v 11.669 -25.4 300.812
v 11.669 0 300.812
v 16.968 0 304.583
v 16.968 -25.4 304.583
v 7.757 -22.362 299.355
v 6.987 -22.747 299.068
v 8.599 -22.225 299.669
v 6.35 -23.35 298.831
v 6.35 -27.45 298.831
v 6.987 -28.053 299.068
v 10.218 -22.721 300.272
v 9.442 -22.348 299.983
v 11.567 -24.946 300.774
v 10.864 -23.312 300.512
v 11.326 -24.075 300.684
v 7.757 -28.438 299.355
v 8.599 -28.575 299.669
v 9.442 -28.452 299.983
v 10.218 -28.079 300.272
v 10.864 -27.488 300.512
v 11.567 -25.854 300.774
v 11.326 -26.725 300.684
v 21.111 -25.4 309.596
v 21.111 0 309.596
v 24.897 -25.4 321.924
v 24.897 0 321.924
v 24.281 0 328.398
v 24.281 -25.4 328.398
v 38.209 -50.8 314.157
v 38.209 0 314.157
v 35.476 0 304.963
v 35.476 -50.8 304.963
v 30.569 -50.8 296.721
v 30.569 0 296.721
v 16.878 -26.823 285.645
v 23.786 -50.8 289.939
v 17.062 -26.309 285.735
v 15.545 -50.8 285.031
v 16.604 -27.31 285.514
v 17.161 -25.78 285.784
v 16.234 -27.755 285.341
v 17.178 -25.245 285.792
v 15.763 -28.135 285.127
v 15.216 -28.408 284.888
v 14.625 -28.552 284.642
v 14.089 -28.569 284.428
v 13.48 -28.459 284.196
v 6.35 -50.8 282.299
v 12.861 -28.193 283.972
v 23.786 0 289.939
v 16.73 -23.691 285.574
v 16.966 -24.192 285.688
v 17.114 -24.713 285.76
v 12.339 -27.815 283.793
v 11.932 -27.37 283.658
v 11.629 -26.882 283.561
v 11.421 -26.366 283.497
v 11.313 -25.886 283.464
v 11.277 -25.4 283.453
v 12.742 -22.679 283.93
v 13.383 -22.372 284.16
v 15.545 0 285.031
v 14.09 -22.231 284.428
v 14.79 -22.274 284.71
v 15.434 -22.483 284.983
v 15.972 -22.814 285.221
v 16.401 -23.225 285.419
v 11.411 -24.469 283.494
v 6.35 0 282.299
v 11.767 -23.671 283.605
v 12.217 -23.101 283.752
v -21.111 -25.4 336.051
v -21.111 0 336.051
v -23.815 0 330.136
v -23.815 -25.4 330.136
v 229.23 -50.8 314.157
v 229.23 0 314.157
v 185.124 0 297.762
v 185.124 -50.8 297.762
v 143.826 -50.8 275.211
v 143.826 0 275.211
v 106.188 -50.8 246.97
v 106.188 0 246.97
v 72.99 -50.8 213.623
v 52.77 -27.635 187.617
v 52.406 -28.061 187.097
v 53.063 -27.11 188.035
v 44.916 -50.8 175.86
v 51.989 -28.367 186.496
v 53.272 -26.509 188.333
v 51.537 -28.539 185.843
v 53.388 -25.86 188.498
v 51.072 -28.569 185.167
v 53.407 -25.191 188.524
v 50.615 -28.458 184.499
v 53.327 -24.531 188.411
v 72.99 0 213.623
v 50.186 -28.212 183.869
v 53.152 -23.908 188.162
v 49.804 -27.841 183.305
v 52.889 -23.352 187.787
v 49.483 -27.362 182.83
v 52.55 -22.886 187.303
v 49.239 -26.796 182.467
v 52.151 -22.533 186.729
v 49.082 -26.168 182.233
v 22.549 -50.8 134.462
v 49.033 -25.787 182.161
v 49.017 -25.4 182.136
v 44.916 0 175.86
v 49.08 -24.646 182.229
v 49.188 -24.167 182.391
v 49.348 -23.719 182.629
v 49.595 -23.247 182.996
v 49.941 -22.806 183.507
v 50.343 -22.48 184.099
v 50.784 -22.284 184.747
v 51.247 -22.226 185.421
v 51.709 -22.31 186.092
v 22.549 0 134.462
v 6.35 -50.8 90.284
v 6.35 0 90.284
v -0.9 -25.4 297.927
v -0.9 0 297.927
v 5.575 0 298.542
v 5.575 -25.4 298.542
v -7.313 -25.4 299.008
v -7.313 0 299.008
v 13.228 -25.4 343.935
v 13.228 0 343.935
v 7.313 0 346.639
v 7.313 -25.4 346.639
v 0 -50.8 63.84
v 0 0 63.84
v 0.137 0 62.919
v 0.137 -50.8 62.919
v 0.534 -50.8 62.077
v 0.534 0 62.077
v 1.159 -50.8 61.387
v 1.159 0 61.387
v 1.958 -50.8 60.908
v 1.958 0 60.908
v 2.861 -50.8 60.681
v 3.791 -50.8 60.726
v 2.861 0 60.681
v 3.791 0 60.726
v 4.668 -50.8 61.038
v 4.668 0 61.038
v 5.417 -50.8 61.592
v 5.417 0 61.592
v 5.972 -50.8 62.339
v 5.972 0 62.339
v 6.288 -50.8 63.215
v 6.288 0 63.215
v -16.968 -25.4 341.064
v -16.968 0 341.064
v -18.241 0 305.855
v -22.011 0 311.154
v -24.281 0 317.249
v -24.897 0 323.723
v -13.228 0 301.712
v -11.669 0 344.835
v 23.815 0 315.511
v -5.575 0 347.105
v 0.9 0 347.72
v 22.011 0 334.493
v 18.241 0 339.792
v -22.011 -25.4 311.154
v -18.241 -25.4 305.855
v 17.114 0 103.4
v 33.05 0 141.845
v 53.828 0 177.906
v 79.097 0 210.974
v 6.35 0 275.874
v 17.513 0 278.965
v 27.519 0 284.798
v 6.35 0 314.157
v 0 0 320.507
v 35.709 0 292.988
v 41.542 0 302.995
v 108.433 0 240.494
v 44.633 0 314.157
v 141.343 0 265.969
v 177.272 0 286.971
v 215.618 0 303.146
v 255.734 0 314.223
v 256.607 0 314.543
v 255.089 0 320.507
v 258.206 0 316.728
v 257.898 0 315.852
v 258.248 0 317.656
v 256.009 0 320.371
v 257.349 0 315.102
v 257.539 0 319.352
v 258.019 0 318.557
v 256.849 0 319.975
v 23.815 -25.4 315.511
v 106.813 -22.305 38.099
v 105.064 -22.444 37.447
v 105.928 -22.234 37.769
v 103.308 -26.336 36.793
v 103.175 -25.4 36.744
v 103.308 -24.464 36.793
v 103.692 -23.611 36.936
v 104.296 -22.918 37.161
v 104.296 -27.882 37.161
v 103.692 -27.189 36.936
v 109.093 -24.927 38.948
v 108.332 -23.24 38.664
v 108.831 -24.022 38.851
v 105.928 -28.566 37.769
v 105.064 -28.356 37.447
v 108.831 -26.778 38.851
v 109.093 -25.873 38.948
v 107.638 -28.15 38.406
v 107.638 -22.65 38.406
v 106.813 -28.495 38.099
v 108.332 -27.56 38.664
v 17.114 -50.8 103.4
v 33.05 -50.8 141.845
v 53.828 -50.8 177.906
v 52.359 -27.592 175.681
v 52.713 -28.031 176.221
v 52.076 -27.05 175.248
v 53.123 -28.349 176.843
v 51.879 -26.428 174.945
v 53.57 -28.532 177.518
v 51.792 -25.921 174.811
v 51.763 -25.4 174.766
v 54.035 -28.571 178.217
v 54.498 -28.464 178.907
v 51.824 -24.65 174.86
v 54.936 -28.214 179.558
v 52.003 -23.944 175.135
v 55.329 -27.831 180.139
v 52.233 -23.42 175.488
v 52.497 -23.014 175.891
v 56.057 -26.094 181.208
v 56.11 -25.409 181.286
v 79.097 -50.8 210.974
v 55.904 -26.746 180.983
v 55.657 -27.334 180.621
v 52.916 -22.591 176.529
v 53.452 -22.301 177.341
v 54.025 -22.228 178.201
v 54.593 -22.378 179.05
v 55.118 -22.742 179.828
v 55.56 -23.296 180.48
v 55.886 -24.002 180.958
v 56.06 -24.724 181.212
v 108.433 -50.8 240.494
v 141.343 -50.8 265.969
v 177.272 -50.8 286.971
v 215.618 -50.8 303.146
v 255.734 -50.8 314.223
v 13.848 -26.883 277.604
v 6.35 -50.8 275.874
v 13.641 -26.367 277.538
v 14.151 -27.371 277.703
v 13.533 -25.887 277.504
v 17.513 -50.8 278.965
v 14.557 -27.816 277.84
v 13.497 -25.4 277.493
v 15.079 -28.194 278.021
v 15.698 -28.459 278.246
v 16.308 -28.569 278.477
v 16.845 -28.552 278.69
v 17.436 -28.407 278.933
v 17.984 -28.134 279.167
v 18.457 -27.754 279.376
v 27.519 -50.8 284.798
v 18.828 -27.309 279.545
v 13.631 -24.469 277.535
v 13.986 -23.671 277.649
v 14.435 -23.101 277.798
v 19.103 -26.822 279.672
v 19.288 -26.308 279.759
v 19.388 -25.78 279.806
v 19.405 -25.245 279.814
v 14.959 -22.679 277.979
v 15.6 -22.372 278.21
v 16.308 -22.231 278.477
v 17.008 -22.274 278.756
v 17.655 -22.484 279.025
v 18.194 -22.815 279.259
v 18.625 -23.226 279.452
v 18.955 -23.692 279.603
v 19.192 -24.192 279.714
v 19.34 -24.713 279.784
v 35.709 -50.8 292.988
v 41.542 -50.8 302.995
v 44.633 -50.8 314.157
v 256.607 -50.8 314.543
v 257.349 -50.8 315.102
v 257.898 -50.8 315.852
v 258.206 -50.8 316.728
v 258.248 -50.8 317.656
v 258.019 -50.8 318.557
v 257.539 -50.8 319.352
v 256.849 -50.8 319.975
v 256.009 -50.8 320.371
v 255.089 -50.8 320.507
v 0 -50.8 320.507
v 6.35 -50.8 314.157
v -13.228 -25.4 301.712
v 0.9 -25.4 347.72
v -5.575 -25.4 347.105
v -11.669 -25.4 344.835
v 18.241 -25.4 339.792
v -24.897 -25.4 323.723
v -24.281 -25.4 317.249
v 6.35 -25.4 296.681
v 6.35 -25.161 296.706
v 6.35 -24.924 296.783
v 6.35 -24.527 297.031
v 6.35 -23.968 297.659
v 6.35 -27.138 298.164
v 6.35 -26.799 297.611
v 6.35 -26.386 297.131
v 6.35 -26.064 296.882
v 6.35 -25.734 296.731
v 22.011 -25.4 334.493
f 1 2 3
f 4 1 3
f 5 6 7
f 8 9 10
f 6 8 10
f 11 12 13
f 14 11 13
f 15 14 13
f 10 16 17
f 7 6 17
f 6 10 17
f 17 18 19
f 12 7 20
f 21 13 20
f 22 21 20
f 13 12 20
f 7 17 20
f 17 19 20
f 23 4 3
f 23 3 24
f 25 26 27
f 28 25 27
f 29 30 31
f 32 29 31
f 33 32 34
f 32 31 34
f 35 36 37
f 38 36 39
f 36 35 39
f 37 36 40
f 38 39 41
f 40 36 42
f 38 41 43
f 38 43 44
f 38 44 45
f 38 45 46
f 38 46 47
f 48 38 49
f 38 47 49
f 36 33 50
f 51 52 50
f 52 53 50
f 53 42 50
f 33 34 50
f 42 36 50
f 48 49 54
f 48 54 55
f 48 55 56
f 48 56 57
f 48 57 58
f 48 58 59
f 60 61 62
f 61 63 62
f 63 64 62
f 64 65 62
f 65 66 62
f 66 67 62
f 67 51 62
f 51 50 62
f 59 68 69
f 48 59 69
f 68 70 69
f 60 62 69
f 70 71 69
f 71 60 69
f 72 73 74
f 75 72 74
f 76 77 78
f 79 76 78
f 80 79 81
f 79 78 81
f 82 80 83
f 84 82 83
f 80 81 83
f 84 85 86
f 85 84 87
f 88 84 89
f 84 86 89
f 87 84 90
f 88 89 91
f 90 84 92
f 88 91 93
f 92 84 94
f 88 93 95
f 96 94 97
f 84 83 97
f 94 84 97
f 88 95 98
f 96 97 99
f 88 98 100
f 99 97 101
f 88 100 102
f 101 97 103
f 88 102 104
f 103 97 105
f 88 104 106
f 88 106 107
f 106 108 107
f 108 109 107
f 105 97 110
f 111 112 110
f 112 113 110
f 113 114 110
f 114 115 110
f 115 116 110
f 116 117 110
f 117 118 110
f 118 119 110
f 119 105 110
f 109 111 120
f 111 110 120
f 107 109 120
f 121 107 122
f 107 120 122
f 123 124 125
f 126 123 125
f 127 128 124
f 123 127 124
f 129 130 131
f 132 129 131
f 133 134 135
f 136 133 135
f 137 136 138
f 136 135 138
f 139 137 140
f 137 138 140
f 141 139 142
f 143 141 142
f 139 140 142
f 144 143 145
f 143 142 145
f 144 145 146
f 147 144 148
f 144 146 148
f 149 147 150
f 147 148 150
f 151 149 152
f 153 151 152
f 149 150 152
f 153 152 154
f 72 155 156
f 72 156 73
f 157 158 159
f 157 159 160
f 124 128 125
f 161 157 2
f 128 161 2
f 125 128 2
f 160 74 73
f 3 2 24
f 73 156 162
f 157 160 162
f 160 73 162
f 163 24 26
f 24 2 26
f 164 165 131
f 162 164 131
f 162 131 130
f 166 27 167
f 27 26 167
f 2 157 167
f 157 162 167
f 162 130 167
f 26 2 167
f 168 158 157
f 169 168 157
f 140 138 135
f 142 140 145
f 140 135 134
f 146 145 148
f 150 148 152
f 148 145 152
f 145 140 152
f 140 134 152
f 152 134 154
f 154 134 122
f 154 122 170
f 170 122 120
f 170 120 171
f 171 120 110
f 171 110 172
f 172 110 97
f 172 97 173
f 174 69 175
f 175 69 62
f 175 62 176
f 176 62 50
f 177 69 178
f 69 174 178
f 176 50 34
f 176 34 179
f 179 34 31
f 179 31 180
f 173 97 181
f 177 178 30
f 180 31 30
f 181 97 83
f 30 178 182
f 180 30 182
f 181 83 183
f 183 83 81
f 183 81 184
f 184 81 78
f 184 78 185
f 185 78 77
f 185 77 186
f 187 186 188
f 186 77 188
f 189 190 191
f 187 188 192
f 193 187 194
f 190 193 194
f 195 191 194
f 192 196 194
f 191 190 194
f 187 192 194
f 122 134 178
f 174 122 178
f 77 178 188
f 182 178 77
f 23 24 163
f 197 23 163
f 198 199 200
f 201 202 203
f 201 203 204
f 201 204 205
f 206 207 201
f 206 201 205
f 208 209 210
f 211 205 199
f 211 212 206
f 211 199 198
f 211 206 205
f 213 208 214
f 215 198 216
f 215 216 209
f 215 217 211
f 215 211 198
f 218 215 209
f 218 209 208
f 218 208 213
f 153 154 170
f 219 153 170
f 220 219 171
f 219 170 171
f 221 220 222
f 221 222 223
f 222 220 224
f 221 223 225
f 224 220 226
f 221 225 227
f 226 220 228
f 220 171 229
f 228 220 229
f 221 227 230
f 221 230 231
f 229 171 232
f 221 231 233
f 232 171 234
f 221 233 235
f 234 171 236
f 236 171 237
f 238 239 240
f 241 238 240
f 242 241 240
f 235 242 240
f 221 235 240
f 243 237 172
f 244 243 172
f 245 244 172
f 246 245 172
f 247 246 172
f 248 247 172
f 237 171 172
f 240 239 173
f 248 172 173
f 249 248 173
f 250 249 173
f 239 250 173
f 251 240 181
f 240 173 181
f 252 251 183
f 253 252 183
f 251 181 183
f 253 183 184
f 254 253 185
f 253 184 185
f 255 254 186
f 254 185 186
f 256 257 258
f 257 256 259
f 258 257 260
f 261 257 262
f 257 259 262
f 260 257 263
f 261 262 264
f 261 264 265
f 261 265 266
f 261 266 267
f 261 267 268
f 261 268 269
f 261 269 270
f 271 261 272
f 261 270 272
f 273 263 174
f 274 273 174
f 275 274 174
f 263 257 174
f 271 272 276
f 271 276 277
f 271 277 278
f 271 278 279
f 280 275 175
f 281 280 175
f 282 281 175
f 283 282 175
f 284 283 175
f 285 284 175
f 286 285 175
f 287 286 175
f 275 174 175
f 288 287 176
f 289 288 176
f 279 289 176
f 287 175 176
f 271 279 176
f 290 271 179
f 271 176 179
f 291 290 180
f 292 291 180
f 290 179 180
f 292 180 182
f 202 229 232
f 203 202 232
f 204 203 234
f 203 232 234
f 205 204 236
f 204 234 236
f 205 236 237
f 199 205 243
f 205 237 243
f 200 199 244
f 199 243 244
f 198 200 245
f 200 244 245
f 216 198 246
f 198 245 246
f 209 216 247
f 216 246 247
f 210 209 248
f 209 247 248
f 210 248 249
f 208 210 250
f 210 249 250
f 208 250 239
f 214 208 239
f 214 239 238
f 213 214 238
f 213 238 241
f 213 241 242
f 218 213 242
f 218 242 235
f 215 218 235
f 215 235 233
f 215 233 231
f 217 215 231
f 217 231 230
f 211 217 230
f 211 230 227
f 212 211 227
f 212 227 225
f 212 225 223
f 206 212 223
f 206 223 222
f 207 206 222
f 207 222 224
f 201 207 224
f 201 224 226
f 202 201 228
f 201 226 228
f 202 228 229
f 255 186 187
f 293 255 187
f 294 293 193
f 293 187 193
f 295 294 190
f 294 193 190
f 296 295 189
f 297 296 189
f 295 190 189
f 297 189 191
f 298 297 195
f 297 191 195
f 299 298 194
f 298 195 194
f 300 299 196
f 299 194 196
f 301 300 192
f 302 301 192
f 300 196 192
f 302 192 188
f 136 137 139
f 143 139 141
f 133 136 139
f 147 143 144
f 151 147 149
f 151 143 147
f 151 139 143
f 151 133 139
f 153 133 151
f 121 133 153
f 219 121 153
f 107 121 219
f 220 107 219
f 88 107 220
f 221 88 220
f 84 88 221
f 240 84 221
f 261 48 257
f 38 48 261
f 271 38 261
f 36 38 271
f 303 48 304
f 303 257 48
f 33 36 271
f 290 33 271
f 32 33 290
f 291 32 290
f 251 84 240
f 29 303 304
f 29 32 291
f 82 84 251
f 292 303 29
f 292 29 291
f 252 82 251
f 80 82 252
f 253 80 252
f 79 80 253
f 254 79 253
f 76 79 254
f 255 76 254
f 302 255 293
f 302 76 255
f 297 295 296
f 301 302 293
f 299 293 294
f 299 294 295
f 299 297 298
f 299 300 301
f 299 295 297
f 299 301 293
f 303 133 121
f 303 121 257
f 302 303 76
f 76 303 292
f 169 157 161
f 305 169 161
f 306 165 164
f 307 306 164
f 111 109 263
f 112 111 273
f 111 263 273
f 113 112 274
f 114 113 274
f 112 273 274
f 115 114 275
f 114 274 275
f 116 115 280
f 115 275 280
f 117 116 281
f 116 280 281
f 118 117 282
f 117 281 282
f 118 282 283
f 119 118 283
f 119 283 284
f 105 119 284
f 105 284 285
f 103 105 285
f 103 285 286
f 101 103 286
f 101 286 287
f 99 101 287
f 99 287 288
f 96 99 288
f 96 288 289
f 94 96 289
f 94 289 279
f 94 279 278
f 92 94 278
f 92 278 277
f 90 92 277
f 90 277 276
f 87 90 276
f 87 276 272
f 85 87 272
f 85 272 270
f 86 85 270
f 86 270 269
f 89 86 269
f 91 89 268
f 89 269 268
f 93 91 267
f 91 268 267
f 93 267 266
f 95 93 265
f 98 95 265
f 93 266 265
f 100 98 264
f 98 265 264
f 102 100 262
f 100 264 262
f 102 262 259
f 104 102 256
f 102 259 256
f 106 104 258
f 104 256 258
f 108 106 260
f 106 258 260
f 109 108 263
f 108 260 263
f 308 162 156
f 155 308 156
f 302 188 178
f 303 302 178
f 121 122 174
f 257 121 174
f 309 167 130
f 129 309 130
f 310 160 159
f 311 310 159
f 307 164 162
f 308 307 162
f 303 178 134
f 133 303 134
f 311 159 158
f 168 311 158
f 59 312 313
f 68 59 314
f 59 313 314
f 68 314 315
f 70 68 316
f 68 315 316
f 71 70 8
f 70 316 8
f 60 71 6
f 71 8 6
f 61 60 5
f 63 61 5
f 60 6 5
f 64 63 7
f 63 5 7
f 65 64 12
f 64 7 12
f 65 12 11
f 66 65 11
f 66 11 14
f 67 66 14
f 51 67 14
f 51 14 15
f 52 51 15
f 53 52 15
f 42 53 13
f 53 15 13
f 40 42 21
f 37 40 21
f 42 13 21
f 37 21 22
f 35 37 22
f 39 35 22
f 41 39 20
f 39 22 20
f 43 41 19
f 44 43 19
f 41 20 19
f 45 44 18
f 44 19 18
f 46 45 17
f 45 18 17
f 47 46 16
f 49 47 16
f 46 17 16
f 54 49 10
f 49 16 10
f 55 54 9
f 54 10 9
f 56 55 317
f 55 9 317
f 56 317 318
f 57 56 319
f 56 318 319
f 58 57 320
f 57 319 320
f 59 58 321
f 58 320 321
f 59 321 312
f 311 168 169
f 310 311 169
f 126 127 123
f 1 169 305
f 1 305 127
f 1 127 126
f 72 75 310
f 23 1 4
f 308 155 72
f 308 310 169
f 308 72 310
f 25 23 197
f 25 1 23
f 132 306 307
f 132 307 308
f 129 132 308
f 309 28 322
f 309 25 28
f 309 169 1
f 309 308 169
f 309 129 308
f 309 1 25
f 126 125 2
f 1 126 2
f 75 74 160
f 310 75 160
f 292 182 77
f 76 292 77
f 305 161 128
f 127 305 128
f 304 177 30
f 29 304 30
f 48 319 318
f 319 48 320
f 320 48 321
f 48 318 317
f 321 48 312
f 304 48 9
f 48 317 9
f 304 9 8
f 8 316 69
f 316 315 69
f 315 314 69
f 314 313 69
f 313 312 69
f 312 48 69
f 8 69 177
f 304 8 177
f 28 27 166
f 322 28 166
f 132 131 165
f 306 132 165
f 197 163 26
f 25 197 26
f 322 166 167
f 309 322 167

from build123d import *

# Parameters (mm, degrees)
F1_DEPTH = 50.8
F3_DEPTH = 25.4
F6_DEPTH = 279.4


with BuildPart() as f1:
    # F0 (on Front) → F1 (new body)
    with BuildSketch(Plane.XZ):
        with BuildLine():
            Line((0, 320.5072749112), (0, 63.8402879052))
            ThreePointArc((0, 63.8402879052), (2.8607431223, 60.6808785276), (6.2877906235, 63.214860424))
            ThreePointArc((6.2877906235, 63.214860424), (93.2857648732, 226.2096554871), (255.734288563, 314.2234492481))
            ThreePointArc((255.734288563, 314.2234492481), (258.247854386, 317.6563918034), (255.0894412971, 320.5072749112))
            Line((255.0894412971, 320.5072749112), (0, 320.5072749112))
        make_face()
        with BuildLine():
            Line((6.35, 275.8740514516), (6.35, 282.2986734306))
            Line((6.35, 282.2986734306), (6.35, 314.1572749112))
            Line((6.35, 314.1572749112), (38.2086014806, 314.1572749112))
            Line((38.2086014806, 314.1572749112), (44.6332234596, 314.1572749112))
            Line((44.6332234596, 314.1572749112), (229.2298219421, 314.1572749112))
            ThreePointArc((229.2298219421, 314.1572749112), (88.988701653, 230.893914438), (6.35, 90.2838009813))
            Line((6.35, 90.2838009813), (6.35, 275.8740514516))
        make_face(mode=Mode.SUBTRACT)
        with BuildLine():
            ThreePointArc((38.2086014806, 314.1572749112), (27.3881336266, 293.1191412846), (6.35, 282.2986734306))
            Line((6.35, 282.2986734306), (6.35, 275.8740514516))
            ThreePointArc((6.35, 275.8740514516), (31.8782616872, 288.629013224), (44.6332234596, 314.1572749112))
            Line((44.6332234596, 314.1572749112), (38.2086014806, 314.1572749112))
        make_face()
    extrude(amount=F1_DEPTH)

    # F4 (on face) → F6 (join)
    with BuildSketch(Plane(origin=(-96.9764298817, 0, 260.3424117621), x_dir=(0.9370984586, 0, 0.3490651498), z_dir=(0.3490651498, 0, -0.9370984586))):
        with BuildLine():
            Line((109.5114211305, 25.4), (115.8614211305, 25.4))
            ThreePointArc((115.8614211305, 25.4), (112.6864211305, 28.575), (109.5114211305, 25.4))
        make_face()
        with BuildLine():
            ThreePointArc((109.5114211305, 25.4), (112.6864211305, 22.225), (115.8614211305, 25.4))
            Line((115.8614211305, 25.4), (109.5114211305, 25.4))
        make_face()
    extrude(amount=F6_DEPTH)


with BuildPart() as f3:
    # F2 (on Front) → F3 (new body)
    with BuildSketch(Plane.XZ):
        Polygon((24.2812376232, 328.3980579991), (22.0110636442, 334.49255508), (18.2408720527, 339.7918229472), (13.2275951754, 343.934725253), (7.3128795465, 346.6389300518), (0.8998032616, 347.7201502554), (-5.5745931286, 347.1047024937), (-11.6690902095, 344.8345285146), (-16.9683580768, 341.0643369232), (-21.1112603826, 336.0510600458), (-23.8154651814, 330.1363444169), (-24.8966853849, 323.723268132), (-24.2812376232, 317.2488717418), (-22.0110636442, 311.1543746609), (-18.2408720527, 305.8551067937), (-13.2275951754, 301.7122044879), (-7.3128795465, 299.0079996891), (-0.8998032616, 297.9267794855), (5.5745931286, 298.5422272472), (11.6690902095, 300.8124012263), (16.9683580768, 304.5825928177), (21.1112603826, 309.5958696951), (23.8154651814, 315.510585324), (24.8966853849, 321.9236616089), align=None)
    extrude(amount=F3_DEPTH)


solid = Compound([f1.part, f3.part])
